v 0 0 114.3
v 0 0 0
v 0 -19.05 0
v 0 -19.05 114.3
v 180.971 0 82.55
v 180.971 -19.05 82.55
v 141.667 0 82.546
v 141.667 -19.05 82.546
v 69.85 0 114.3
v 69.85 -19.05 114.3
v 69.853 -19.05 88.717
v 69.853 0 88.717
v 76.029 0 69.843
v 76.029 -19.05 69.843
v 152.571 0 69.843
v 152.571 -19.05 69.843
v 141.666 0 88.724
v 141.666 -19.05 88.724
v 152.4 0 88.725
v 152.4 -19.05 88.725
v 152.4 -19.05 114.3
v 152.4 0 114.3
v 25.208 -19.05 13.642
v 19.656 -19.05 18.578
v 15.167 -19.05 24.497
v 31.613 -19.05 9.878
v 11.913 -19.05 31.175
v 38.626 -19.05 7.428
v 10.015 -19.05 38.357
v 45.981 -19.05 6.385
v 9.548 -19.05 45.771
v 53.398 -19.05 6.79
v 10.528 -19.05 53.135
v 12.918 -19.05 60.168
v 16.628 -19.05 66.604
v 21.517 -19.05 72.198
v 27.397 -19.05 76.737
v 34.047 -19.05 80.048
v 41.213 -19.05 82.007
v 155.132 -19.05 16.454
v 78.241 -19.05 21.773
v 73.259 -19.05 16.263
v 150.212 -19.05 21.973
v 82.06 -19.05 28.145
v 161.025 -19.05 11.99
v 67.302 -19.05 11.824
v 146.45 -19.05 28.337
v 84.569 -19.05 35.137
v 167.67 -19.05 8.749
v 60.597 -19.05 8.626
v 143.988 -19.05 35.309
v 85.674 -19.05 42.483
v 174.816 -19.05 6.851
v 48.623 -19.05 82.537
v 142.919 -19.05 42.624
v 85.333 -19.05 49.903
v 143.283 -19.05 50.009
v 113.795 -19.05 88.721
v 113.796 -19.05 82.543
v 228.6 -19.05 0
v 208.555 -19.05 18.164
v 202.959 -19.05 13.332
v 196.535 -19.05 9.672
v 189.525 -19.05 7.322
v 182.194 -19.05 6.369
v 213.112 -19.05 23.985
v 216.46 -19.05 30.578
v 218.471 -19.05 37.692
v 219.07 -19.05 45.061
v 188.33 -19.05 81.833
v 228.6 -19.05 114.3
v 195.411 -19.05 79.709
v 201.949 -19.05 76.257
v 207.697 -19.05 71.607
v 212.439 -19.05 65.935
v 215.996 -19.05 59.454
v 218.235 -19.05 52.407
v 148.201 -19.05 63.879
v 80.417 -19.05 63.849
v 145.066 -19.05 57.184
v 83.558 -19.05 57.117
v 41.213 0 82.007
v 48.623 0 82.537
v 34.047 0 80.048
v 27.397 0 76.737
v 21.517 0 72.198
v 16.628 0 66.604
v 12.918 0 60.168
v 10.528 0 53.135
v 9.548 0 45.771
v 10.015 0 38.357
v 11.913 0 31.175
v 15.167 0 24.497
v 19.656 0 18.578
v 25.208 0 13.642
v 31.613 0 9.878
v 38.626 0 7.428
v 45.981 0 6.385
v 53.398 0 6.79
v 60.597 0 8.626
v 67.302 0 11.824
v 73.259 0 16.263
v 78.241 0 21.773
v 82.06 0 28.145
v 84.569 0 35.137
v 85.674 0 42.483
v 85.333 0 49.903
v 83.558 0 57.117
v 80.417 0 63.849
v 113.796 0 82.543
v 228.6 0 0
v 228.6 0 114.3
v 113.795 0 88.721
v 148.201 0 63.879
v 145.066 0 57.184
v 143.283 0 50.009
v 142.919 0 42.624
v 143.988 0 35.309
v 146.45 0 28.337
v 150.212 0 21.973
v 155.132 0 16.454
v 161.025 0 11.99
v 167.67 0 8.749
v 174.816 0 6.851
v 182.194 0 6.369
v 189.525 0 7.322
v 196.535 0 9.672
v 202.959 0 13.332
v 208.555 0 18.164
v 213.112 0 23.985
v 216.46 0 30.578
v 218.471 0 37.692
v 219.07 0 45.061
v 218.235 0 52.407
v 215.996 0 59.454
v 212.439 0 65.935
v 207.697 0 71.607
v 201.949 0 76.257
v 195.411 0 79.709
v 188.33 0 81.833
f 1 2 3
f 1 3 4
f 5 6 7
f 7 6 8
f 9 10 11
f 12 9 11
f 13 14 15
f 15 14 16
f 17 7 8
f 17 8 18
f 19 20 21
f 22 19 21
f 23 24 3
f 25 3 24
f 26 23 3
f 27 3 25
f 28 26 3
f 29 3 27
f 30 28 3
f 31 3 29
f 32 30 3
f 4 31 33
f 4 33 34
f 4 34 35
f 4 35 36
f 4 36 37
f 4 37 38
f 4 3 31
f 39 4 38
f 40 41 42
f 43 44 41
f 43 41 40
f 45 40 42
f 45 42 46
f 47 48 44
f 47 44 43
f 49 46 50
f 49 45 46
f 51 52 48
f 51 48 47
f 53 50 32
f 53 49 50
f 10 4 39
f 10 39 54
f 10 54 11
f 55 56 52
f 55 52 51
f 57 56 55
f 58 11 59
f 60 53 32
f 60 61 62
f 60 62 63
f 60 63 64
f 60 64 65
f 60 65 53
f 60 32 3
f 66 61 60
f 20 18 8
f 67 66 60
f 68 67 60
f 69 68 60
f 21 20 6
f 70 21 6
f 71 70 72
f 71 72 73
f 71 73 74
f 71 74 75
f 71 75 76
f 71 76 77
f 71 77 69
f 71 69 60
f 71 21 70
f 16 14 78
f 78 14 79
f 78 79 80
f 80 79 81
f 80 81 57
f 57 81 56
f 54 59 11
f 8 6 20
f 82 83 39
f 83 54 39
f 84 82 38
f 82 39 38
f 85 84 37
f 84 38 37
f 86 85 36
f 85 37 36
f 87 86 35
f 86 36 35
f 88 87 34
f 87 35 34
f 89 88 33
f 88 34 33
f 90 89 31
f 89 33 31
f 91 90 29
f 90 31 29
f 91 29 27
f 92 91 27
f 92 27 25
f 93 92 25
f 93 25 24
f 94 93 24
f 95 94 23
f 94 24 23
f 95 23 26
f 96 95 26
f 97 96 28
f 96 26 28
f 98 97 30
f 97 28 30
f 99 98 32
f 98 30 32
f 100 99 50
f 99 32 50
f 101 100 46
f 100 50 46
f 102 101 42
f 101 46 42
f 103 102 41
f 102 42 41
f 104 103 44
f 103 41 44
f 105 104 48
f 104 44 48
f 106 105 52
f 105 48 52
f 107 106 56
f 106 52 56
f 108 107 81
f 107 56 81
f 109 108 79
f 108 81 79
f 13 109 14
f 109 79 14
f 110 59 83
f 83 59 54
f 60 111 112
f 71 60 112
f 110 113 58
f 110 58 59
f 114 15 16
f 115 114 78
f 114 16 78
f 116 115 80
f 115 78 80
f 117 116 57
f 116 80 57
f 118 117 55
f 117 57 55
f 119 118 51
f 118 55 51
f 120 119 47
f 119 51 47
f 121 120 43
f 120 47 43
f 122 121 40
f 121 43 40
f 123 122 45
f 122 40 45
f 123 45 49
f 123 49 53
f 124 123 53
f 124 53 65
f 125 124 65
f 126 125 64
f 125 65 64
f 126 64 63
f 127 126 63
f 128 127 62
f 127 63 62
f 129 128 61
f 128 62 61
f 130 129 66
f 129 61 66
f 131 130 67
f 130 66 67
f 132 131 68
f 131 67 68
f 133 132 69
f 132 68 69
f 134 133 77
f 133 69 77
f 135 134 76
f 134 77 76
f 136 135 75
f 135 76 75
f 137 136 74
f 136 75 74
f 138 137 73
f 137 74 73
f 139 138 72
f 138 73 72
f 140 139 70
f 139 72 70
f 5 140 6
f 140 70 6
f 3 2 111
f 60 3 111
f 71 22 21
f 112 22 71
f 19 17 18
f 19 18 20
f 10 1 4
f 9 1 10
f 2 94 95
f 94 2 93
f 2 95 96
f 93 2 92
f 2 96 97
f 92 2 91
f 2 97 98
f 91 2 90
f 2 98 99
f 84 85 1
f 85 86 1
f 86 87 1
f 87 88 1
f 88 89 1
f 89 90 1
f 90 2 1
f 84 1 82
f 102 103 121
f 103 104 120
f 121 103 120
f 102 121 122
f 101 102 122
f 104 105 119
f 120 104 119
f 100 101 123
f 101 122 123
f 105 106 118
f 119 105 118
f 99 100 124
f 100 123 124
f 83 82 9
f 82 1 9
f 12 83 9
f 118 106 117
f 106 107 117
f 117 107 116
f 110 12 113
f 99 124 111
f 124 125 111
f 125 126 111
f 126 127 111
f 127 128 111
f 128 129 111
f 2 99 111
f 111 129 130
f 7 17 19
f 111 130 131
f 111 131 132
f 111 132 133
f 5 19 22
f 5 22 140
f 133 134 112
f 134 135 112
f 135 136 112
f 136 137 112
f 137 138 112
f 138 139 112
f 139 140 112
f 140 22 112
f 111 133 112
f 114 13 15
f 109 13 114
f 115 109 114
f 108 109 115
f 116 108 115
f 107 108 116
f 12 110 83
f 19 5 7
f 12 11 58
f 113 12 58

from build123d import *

# Parameters (mm, degrees)
F0_W     = 228.6
F0_H     = 114.3
F1_DEPTH = 19.05
F2_R     = 38.1
F3_DEPTH = 25.4
F5_DEPTH = 25.4


with BuildPart() as f1:
    # F0 (on Front) → F1 (new body)
    with BuildSketch(Plane.XZ):
        with Locations((114.3, 57.15)):
            Rectangle(F0_W, F0_H)
    extrude(amount=F1_DEPTH)

    # F2 (on face) → F3 (cut)
    with BuildSketch(Plane.XZ.offset(19.05)):
        with Locations((47.625, 44.45)):
            Circle(F2_R)
        with Locations((180.975, 44.45)):
            Circle(F2_R)
    extrude(amount=-F3_DEPTH, mode=Mode.SUBTRACT)

    # F4 (on face) → F5 (cut)
    with BuildSketch(Plane.XZ.offset(19.05)):
        with BuildLine():
            ThreePointArc((152.571006, 69.843368), (165.414963, 79.227798), (180.971239, 82.55))
            Line((180.971239, 82.55), (141.666685, 82.54612))
            Line((141.666685, 82.54612), (141.666075, 88.724122))
            Line((141.666075, 88.724122), (152.4, 88.725182))
            Line((152.4, 88.725182), (152.4, 114.3))
            Line((152.4, 114.3), (69.85, 114.3))
            Line((69.85, 114.3), (69.852526, 88.717033))
            Line((69.852526, 88.717033), (113.794894, 88.721371))
            Line((113.794894, 88.721371), (113.795504, 82.543368))
            Line((113.795504, 82.543368), (48.622711, 82.536934))
            ThreePointArc((48.622711, 82.536934), (63.637392, 79.021857), (76.028994, 69.843368))
            Line((76.028994, 69.843368), (152.571006, 69.843368))
        make_face()
    extrude(amount=-F5_DEPTH, mode=Mode.SUBTRACT)


solid = f1.part
